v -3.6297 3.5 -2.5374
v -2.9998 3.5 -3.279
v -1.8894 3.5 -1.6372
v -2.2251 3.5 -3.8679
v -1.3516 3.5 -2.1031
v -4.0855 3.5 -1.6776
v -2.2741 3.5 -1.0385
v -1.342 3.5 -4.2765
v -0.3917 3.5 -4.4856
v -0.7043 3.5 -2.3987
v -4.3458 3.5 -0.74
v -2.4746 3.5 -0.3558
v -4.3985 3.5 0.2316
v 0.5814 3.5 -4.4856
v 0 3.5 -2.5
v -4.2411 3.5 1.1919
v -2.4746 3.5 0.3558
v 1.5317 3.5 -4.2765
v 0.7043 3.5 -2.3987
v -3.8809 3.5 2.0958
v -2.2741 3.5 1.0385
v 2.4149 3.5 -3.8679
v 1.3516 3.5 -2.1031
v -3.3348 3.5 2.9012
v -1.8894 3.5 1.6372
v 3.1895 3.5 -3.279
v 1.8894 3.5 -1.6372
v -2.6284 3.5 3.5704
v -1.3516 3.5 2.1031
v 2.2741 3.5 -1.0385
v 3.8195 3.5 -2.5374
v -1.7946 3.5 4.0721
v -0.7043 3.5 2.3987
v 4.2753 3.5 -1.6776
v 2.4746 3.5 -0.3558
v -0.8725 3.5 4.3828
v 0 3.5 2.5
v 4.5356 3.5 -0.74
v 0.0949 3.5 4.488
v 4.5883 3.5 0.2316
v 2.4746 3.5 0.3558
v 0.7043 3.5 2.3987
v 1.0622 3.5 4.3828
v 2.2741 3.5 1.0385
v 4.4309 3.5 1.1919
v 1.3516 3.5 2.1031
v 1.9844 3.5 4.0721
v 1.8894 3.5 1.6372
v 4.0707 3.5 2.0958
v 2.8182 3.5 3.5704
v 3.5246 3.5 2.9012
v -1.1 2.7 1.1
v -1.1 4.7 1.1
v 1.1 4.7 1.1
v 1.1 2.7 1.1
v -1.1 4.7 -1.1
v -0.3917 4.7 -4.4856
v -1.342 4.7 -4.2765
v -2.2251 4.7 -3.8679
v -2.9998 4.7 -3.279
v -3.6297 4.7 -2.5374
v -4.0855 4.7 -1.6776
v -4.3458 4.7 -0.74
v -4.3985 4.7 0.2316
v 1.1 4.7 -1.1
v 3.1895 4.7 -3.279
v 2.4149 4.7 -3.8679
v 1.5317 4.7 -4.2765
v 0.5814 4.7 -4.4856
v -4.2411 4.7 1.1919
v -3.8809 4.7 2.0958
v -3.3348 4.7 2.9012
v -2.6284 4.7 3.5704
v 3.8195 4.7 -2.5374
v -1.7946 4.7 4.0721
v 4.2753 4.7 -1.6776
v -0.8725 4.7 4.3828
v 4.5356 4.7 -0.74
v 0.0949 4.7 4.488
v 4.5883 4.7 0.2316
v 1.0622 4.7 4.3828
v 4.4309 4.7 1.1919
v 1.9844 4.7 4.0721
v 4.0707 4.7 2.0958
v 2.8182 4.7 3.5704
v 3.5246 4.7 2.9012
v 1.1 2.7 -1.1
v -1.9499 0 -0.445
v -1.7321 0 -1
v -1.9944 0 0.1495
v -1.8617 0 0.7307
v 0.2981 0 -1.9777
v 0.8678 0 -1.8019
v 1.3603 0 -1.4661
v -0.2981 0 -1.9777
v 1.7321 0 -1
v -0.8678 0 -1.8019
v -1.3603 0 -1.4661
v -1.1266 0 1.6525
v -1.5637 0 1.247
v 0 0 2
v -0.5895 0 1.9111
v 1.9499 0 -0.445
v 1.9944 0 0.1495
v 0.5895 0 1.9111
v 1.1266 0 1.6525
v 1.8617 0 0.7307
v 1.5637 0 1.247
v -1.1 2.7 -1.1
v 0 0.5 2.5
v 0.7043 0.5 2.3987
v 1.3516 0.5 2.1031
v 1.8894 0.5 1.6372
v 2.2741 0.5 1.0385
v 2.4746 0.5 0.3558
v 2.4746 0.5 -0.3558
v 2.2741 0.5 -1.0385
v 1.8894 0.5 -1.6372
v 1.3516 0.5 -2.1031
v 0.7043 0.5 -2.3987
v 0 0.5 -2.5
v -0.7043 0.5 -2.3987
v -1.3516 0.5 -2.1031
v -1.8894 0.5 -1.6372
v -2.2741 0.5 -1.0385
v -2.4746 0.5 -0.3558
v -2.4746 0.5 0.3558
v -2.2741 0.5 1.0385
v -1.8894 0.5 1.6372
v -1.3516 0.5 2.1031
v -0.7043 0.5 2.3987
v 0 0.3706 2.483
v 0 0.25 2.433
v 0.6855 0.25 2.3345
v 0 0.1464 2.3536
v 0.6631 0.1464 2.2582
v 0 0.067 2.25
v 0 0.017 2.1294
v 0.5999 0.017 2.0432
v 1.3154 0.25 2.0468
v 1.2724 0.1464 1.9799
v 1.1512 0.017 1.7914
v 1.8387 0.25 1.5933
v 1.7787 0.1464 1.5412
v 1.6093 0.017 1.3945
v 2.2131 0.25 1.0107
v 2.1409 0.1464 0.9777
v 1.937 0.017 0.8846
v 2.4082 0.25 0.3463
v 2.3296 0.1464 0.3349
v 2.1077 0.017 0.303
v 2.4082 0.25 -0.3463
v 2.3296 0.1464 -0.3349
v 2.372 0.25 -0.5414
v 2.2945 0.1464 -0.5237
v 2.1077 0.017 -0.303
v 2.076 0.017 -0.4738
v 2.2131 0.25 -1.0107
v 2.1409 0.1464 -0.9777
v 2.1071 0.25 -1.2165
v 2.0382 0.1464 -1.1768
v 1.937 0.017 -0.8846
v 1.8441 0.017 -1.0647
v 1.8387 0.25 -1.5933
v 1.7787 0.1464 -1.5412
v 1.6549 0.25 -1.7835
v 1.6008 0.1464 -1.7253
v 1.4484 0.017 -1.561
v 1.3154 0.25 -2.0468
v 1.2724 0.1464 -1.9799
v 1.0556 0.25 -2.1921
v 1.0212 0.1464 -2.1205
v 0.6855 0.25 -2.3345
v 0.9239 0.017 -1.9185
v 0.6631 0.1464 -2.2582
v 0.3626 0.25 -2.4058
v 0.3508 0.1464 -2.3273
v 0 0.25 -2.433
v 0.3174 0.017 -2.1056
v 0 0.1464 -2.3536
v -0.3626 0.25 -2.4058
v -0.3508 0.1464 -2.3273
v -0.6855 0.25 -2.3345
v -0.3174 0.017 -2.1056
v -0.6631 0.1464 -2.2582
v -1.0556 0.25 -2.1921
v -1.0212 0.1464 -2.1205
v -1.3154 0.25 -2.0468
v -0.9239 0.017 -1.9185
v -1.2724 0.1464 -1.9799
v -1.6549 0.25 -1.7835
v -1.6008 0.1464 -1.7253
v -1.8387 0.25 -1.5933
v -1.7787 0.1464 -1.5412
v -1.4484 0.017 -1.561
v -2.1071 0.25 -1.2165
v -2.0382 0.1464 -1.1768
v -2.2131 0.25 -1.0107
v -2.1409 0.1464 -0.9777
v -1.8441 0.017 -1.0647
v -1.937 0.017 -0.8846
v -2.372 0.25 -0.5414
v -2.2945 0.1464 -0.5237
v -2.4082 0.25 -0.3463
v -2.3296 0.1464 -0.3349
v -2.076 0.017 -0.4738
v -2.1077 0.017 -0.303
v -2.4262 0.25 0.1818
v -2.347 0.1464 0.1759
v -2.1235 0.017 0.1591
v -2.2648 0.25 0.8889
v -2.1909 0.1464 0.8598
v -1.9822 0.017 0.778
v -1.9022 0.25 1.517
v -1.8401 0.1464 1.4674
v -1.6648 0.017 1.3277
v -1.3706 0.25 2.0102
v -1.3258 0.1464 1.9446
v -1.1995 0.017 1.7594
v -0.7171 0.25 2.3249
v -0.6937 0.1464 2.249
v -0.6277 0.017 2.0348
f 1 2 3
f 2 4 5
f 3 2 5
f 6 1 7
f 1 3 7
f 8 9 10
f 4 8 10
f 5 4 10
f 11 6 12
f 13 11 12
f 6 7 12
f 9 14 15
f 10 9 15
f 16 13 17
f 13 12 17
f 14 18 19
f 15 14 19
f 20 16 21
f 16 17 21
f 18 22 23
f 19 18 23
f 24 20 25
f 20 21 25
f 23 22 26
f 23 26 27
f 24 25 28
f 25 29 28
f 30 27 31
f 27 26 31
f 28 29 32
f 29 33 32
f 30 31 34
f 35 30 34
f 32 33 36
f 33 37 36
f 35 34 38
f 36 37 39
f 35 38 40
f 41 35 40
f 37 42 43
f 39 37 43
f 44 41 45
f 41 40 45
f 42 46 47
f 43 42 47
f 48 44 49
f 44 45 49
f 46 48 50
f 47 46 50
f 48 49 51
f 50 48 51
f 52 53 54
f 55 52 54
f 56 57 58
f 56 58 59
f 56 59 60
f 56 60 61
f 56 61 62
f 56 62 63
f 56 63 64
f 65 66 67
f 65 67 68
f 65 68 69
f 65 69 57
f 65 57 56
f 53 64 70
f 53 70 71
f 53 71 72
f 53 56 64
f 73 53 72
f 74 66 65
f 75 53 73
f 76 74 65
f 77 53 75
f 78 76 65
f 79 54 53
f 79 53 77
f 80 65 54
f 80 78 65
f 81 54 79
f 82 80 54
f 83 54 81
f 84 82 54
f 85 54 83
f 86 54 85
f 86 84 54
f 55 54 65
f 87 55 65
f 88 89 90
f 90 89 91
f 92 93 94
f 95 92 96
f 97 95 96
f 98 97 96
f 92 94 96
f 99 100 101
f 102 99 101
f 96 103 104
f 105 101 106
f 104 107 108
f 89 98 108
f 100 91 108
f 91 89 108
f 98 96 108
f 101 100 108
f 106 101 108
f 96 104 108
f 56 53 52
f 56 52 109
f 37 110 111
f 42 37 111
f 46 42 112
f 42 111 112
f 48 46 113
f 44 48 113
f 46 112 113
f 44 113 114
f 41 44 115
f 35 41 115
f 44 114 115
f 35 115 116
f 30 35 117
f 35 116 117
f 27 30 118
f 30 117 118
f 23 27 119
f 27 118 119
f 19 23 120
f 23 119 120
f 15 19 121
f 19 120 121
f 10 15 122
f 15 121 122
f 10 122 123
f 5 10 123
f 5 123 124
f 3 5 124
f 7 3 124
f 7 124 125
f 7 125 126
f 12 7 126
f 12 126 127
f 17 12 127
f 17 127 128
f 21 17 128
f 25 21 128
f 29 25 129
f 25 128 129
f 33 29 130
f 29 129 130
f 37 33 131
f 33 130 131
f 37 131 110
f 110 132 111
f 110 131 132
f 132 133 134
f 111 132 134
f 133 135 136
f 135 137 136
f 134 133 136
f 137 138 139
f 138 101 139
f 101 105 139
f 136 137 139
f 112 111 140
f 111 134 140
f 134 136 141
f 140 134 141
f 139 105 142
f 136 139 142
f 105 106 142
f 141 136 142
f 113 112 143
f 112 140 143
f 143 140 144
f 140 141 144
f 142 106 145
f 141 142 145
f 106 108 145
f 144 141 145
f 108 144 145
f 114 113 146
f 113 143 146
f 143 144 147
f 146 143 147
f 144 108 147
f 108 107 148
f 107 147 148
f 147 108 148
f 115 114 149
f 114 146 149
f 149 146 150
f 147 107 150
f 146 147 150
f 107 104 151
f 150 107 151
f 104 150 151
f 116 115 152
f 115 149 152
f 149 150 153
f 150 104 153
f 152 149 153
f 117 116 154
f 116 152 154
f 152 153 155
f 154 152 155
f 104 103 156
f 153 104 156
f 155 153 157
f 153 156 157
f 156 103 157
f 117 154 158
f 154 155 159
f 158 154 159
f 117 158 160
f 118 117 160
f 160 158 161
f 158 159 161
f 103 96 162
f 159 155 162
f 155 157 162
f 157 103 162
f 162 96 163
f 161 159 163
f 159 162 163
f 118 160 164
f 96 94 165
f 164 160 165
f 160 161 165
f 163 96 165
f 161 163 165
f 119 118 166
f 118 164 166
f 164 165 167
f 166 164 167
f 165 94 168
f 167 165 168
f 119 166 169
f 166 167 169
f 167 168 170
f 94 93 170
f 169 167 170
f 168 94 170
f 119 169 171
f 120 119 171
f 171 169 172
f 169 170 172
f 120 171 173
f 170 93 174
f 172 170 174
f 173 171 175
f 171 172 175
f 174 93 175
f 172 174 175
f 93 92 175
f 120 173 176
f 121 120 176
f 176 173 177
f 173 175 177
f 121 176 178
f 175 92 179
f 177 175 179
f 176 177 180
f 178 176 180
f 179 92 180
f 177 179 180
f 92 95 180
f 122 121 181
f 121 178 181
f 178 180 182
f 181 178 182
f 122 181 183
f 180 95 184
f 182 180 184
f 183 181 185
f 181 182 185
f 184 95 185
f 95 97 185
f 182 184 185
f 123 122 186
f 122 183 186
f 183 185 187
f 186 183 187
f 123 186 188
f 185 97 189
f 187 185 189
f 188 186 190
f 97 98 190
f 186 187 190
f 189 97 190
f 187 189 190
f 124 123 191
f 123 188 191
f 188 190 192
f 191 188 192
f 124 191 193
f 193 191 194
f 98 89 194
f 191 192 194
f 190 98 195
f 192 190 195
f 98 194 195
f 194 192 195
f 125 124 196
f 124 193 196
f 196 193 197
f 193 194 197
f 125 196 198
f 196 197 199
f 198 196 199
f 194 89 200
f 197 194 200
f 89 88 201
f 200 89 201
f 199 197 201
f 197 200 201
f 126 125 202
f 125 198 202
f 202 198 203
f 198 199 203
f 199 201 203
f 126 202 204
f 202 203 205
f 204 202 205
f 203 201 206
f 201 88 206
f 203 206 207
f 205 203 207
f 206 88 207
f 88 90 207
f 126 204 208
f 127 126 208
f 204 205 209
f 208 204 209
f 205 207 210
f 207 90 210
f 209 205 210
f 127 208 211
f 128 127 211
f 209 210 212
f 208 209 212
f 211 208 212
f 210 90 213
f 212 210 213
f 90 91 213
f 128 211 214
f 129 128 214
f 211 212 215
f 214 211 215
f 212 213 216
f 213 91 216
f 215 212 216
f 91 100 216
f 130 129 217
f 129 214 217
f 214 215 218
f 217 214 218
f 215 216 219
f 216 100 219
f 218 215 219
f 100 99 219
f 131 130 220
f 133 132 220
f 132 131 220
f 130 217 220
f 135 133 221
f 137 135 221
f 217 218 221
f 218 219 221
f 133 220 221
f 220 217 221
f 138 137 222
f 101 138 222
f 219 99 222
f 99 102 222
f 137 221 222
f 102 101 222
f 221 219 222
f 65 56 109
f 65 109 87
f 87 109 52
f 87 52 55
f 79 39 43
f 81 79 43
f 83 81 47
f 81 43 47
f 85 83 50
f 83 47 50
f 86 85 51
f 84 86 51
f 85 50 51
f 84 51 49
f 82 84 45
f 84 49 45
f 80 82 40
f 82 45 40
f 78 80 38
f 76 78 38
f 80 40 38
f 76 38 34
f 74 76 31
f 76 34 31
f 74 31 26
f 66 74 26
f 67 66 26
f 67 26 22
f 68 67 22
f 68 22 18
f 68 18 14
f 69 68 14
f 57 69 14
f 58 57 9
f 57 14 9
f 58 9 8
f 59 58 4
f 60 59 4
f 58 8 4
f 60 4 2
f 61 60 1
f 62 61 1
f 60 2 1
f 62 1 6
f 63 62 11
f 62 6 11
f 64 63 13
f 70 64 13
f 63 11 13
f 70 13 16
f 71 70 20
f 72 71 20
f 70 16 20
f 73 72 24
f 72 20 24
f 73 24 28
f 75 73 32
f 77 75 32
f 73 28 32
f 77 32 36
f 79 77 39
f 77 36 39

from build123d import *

# Parameters (mm, degrees)
SKETCH_1_R          = 2.5
EXTRUDE_1_DEPTH     = 3.5
SKETCH_2_R          = 4.5
EXTRUDE_2_DEPTH     = 1.2
SKETCH_4_W          = 2.2
SKETCH_4_H          = 2.2
CUT_EXTRUDE_1_DEPTH = 2
FILLET_1_R          = 0.5


with BuildPart() as part:
    # 草图1 → 凸台-拉伸1 (new body)
    with BuildSketch(Plane(origin=(0, 0, 0), x_dir=(1, 0, 0), z_dir=(0, 1, 0))):
        with Locations(Location((0, 0, 0), (0, 0, 270))):
            Circle(SKETCH_1_R)
    extrude(amount=EXTRUDE_1_DEPTH)

    # 草图2 → 凸台-拉伸2 (add)
    with BuildSketch(Plane(origin=(0, 3.5, 0), x_dir=(1, 0, 0), z_dir=(0, 1, 0))):
        with Locations(Location((0.094879954, 0.012027373, 0), (0, 0, 270))):
            Circle(SKETCH_2_R)
    extrude(amount=EXTRUDE_2_DEPTH)

    # 草图4 → 切除-拉伸1 (cut)
    with BuildSketch(Plane(origin=(0, 4.7, 0), x_dir=(1, 0, 0), z_dir=(0, 1, 0))):
        Rectangle(SKETCH_4_W, SKETCH_4_H)
    extrude(amount=-CUT_EXTRUDE_1_DEPTH, mode=Mode.SUBTRACT)

    # 圆角1
    fillet_1_edges = [part.edges().sort_by_distance(p)[0] for p in [
        (0, 0, -2.5),
    ]]
    fillet(fillet_1_edges, radius=FILLET_1_R)


solid = part.part
